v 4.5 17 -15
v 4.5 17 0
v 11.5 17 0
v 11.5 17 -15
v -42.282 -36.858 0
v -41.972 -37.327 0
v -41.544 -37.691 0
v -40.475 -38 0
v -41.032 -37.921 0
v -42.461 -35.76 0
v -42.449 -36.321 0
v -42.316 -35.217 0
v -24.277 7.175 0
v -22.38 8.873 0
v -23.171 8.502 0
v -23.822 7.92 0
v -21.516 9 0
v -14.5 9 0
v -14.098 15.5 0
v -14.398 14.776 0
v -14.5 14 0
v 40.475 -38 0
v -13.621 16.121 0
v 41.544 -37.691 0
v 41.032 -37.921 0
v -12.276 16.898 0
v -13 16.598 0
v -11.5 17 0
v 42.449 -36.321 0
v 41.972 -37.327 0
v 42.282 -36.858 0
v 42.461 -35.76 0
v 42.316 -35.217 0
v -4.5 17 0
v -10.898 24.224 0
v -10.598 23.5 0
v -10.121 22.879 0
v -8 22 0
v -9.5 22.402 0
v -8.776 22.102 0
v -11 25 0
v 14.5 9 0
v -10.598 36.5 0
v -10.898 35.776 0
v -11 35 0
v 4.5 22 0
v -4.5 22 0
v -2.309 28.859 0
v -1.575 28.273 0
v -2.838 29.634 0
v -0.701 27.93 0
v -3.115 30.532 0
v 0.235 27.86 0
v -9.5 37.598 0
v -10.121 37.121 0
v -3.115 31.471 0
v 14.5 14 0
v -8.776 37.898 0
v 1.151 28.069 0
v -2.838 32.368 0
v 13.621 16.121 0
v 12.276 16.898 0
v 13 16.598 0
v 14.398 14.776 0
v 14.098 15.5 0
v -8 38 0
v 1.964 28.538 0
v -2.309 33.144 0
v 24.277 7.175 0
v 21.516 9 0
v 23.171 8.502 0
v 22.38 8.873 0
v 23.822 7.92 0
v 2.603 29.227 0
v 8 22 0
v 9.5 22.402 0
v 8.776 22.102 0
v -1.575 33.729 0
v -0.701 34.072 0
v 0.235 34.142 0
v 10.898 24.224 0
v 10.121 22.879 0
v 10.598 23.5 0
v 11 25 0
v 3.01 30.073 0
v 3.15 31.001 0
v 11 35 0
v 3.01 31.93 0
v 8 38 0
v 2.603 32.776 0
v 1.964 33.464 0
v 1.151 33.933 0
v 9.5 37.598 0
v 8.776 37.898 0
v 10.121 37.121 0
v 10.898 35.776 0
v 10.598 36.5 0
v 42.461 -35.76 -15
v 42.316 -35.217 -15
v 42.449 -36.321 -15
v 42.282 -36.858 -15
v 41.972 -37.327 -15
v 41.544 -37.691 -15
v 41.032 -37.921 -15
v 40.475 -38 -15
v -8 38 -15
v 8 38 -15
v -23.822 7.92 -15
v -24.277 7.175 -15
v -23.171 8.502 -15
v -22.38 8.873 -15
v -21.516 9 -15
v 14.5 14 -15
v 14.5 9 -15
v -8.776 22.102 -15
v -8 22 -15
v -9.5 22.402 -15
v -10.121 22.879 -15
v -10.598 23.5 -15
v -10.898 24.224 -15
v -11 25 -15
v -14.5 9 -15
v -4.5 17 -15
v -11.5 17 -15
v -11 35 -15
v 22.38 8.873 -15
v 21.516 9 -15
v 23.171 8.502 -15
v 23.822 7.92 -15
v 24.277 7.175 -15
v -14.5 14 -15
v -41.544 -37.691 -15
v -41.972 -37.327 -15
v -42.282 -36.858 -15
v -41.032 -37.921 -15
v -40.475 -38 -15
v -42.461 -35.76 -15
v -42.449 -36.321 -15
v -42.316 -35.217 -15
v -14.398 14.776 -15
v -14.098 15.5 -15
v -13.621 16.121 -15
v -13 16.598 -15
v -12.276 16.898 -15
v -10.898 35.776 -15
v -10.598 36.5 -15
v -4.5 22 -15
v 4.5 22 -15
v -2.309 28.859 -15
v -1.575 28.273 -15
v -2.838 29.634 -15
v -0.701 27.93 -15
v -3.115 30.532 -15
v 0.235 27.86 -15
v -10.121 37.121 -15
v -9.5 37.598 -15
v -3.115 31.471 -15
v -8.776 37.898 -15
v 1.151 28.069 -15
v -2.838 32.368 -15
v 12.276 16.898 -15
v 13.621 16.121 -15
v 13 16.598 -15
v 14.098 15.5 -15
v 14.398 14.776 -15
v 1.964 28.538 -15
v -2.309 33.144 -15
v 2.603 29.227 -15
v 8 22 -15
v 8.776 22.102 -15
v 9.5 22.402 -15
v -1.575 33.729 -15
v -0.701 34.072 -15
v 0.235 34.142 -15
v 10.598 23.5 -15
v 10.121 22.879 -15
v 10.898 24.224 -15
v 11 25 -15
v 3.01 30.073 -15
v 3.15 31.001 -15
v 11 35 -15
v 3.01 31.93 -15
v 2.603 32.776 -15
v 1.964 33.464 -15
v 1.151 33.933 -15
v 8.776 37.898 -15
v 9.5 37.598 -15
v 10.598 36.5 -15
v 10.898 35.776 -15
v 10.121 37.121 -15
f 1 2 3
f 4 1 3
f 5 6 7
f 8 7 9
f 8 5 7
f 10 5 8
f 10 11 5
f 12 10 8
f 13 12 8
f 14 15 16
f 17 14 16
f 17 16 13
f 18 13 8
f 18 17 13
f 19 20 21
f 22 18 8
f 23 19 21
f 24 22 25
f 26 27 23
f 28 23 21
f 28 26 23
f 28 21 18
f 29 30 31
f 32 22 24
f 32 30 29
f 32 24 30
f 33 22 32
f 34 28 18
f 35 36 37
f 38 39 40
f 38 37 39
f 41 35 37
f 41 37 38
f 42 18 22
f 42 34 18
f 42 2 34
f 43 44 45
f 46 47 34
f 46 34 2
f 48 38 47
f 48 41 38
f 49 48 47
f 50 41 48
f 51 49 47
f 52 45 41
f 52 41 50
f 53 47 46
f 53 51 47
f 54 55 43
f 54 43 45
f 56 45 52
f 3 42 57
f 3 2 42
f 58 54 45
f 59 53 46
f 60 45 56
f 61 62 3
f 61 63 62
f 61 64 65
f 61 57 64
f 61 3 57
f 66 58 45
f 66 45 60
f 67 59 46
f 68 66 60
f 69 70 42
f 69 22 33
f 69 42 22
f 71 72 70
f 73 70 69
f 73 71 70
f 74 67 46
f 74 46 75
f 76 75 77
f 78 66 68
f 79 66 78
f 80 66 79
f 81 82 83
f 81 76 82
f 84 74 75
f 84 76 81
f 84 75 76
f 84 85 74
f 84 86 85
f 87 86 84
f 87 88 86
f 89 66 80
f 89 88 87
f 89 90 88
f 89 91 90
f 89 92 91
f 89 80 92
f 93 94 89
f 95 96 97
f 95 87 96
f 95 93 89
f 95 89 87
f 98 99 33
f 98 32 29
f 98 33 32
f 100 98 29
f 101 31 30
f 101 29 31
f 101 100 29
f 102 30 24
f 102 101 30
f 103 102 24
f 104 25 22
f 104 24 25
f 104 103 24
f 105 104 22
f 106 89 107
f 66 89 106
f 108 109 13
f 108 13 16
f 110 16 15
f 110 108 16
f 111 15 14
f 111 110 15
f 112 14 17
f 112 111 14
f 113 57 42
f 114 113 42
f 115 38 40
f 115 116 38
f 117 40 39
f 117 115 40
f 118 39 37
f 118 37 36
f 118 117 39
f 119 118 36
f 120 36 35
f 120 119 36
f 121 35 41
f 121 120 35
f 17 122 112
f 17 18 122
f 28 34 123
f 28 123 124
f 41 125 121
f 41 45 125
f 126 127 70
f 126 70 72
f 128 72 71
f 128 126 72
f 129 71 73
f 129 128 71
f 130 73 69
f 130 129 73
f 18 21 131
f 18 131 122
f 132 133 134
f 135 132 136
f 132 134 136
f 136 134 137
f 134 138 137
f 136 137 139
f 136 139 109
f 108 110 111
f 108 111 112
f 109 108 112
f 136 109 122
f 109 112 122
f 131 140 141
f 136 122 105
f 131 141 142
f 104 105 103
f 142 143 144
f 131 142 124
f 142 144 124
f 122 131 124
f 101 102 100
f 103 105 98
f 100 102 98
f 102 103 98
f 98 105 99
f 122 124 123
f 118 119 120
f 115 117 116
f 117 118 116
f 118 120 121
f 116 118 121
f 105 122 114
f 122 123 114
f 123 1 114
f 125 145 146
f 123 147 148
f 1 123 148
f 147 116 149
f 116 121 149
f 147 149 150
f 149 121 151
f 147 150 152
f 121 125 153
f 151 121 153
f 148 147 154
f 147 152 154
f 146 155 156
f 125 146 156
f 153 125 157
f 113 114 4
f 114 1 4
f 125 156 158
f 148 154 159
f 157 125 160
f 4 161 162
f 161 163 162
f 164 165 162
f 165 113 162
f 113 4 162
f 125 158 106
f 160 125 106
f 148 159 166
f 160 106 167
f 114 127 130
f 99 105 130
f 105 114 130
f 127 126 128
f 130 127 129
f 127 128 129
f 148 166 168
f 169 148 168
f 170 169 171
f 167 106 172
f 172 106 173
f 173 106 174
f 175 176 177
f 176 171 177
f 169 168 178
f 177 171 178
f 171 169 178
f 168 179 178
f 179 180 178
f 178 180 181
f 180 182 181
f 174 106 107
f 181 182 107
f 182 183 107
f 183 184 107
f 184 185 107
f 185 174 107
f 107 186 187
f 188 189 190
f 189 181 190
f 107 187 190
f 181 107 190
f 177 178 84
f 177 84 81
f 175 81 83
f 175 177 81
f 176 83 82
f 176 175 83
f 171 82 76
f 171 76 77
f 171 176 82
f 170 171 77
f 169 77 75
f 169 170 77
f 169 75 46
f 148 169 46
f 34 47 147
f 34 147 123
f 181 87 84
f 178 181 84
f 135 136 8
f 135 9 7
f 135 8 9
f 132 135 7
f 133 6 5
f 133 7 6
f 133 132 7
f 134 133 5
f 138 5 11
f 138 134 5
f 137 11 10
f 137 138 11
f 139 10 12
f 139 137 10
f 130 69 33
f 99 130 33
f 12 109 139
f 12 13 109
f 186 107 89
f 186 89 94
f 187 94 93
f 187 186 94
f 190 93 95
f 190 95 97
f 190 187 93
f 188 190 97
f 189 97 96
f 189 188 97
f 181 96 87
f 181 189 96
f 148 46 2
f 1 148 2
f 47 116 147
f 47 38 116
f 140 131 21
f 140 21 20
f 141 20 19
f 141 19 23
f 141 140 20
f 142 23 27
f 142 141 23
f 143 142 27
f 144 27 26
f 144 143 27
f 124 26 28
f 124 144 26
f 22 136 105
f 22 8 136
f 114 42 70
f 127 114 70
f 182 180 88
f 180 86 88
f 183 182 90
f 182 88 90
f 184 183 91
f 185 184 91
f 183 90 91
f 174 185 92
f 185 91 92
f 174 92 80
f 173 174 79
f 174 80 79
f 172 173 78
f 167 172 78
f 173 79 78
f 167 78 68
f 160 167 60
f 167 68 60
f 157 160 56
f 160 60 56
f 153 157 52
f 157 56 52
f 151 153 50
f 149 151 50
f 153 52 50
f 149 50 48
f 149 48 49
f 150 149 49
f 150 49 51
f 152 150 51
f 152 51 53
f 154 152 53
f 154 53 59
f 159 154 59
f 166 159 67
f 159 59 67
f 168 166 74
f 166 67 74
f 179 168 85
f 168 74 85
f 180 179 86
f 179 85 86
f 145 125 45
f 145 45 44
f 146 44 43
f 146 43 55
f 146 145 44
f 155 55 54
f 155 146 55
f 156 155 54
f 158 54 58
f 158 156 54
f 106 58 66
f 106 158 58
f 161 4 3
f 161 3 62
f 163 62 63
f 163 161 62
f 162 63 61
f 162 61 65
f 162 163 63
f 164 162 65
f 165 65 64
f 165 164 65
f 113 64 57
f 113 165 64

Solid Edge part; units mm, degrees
sketch "Sketch1" plane through (0, 0, 0) normal (0, 0, 1) x (1, 0, 0)
  line L0 (-43.5, -38) -> (43.5, -38)
  line L1 (43.5, -38) -> (43.5, 38)
  line L2 (43.5, 38) -> (-43.5, 38)
  line L3 (-43.5, 38) -> (-43.5, -38)
extrude "Protrusion1" add sketch "Sketch1" against normal blind 15
sketch "Sketch2" plane through (0, 0, 0) normal (0, 0, 1) x (1, 0, 0)
  line L0 (-43.5, 38) -> (-11, 38)
  line L1 (-11, 38) -> (-11, 22)
  line L2 (-11, 22) -> (-43.5, 22)
  line L3 (-43.5, 22) -> (-43.5, 38)
  line L4 (43.5, 38) -> (11, 38)
  line L5 (11, 38) -> (11, 22)
  line L6 (11, 22) -> (43.5, 22)
  line L7 (43.5, 22) -> (43.5, 38)
extrude "ExtrudedCutout_1" cut sketch "Sketch2" against normal blind 15
sketch "Sketch3" plane through (0, 0, 0) normal (0, 0, 1) x (1, 0, 0)
  line L0 (-43.5, 22) -> (-4.5, 22)
  line L1 (-4.5, 22) -> (-4.5, 17)
  line L2 (-4.5, 17) -> (-43.5, 17)
  line L3 (-43.5, 17) -> (-43.5, 22)
  line L4 (43.5, 22) -> (4.5, 22)
  line L5 (4.5, 22) -> (4.5, 17)
  line L6 (4.5, 17) -> (43.5, 17)
  line L7 (43.5, 17) -> (43.5, 22)
extrude "ExtrudedCutout_2" cut sketch "Sketch3" against normal blind 15
sketch "Sketch4" plane through (0, 0, 0) normal (0, 0, 1) x (1, 0, 0)
  line L0 (-43.5, 17) -> (-14.5, 17)
  line L1 (-14.5, 17) -> (-14.5, 9)
  line L2 (-14.5, 9) -> (-43.5, 9)
  line L3 (-43.5, 9) -> (-43.5, 17)
  line L4 (43.5, 17) -> (14.5, 17)
  line L5 (14.5, 17) -> (14.5, 9)
  line L6 (14.5, 9) -> (43.5, 9)
  line L7 (43.5, 9) -> (43.5, 17)
extrude "ExtrudedCutout_3" cut sketch "Sketch4" against normal blind 15
sketch "Sketch5" plane through (0, 0, 0) normal (0, 0, 1) x (1, 0, 0)
  line L0 (-23.5, 9) -> (-43.5, -38)
  line L1 (-43.5, -38) -> (-43.5, 9)
  line L2 (-43.5, 9) -> (-23.5, 9)
  line L3 (23.5, 9) -> (43.5, -38)
  line L4 (43.5, -38) -> (43.5, 9)
  line L5 (43.5, 9) -> (23.5, 9)
extrude "ExtrudedCutout_4" cut sketch "Sketch5" against normal blind 15
fillet "Round_1" radius 3 8 edges at (23.5, 9, -7.5) (11, 22, -7.5) (11, 38, -7.5) (14.5, 17, -7.5) (-11, 38, -7.5) (-11, 22, -7.5) (-14.5, 17, -7.5) (-23.5, 9, -7.5)
fillet "Round_2" radius 2 2 edges at (43.5, -38, -7.5) (-43.5, -38, -7.5)
sketch "Sketch6" plane through (0, 0, 0) normal (0, 0, 1) x (1, 0, 0)
  circle A0 centre (0, 31.0011) radius 3.15
extrude "ExtrudedCutout_5" cut sketch "Sketch6" against normal blind 15
